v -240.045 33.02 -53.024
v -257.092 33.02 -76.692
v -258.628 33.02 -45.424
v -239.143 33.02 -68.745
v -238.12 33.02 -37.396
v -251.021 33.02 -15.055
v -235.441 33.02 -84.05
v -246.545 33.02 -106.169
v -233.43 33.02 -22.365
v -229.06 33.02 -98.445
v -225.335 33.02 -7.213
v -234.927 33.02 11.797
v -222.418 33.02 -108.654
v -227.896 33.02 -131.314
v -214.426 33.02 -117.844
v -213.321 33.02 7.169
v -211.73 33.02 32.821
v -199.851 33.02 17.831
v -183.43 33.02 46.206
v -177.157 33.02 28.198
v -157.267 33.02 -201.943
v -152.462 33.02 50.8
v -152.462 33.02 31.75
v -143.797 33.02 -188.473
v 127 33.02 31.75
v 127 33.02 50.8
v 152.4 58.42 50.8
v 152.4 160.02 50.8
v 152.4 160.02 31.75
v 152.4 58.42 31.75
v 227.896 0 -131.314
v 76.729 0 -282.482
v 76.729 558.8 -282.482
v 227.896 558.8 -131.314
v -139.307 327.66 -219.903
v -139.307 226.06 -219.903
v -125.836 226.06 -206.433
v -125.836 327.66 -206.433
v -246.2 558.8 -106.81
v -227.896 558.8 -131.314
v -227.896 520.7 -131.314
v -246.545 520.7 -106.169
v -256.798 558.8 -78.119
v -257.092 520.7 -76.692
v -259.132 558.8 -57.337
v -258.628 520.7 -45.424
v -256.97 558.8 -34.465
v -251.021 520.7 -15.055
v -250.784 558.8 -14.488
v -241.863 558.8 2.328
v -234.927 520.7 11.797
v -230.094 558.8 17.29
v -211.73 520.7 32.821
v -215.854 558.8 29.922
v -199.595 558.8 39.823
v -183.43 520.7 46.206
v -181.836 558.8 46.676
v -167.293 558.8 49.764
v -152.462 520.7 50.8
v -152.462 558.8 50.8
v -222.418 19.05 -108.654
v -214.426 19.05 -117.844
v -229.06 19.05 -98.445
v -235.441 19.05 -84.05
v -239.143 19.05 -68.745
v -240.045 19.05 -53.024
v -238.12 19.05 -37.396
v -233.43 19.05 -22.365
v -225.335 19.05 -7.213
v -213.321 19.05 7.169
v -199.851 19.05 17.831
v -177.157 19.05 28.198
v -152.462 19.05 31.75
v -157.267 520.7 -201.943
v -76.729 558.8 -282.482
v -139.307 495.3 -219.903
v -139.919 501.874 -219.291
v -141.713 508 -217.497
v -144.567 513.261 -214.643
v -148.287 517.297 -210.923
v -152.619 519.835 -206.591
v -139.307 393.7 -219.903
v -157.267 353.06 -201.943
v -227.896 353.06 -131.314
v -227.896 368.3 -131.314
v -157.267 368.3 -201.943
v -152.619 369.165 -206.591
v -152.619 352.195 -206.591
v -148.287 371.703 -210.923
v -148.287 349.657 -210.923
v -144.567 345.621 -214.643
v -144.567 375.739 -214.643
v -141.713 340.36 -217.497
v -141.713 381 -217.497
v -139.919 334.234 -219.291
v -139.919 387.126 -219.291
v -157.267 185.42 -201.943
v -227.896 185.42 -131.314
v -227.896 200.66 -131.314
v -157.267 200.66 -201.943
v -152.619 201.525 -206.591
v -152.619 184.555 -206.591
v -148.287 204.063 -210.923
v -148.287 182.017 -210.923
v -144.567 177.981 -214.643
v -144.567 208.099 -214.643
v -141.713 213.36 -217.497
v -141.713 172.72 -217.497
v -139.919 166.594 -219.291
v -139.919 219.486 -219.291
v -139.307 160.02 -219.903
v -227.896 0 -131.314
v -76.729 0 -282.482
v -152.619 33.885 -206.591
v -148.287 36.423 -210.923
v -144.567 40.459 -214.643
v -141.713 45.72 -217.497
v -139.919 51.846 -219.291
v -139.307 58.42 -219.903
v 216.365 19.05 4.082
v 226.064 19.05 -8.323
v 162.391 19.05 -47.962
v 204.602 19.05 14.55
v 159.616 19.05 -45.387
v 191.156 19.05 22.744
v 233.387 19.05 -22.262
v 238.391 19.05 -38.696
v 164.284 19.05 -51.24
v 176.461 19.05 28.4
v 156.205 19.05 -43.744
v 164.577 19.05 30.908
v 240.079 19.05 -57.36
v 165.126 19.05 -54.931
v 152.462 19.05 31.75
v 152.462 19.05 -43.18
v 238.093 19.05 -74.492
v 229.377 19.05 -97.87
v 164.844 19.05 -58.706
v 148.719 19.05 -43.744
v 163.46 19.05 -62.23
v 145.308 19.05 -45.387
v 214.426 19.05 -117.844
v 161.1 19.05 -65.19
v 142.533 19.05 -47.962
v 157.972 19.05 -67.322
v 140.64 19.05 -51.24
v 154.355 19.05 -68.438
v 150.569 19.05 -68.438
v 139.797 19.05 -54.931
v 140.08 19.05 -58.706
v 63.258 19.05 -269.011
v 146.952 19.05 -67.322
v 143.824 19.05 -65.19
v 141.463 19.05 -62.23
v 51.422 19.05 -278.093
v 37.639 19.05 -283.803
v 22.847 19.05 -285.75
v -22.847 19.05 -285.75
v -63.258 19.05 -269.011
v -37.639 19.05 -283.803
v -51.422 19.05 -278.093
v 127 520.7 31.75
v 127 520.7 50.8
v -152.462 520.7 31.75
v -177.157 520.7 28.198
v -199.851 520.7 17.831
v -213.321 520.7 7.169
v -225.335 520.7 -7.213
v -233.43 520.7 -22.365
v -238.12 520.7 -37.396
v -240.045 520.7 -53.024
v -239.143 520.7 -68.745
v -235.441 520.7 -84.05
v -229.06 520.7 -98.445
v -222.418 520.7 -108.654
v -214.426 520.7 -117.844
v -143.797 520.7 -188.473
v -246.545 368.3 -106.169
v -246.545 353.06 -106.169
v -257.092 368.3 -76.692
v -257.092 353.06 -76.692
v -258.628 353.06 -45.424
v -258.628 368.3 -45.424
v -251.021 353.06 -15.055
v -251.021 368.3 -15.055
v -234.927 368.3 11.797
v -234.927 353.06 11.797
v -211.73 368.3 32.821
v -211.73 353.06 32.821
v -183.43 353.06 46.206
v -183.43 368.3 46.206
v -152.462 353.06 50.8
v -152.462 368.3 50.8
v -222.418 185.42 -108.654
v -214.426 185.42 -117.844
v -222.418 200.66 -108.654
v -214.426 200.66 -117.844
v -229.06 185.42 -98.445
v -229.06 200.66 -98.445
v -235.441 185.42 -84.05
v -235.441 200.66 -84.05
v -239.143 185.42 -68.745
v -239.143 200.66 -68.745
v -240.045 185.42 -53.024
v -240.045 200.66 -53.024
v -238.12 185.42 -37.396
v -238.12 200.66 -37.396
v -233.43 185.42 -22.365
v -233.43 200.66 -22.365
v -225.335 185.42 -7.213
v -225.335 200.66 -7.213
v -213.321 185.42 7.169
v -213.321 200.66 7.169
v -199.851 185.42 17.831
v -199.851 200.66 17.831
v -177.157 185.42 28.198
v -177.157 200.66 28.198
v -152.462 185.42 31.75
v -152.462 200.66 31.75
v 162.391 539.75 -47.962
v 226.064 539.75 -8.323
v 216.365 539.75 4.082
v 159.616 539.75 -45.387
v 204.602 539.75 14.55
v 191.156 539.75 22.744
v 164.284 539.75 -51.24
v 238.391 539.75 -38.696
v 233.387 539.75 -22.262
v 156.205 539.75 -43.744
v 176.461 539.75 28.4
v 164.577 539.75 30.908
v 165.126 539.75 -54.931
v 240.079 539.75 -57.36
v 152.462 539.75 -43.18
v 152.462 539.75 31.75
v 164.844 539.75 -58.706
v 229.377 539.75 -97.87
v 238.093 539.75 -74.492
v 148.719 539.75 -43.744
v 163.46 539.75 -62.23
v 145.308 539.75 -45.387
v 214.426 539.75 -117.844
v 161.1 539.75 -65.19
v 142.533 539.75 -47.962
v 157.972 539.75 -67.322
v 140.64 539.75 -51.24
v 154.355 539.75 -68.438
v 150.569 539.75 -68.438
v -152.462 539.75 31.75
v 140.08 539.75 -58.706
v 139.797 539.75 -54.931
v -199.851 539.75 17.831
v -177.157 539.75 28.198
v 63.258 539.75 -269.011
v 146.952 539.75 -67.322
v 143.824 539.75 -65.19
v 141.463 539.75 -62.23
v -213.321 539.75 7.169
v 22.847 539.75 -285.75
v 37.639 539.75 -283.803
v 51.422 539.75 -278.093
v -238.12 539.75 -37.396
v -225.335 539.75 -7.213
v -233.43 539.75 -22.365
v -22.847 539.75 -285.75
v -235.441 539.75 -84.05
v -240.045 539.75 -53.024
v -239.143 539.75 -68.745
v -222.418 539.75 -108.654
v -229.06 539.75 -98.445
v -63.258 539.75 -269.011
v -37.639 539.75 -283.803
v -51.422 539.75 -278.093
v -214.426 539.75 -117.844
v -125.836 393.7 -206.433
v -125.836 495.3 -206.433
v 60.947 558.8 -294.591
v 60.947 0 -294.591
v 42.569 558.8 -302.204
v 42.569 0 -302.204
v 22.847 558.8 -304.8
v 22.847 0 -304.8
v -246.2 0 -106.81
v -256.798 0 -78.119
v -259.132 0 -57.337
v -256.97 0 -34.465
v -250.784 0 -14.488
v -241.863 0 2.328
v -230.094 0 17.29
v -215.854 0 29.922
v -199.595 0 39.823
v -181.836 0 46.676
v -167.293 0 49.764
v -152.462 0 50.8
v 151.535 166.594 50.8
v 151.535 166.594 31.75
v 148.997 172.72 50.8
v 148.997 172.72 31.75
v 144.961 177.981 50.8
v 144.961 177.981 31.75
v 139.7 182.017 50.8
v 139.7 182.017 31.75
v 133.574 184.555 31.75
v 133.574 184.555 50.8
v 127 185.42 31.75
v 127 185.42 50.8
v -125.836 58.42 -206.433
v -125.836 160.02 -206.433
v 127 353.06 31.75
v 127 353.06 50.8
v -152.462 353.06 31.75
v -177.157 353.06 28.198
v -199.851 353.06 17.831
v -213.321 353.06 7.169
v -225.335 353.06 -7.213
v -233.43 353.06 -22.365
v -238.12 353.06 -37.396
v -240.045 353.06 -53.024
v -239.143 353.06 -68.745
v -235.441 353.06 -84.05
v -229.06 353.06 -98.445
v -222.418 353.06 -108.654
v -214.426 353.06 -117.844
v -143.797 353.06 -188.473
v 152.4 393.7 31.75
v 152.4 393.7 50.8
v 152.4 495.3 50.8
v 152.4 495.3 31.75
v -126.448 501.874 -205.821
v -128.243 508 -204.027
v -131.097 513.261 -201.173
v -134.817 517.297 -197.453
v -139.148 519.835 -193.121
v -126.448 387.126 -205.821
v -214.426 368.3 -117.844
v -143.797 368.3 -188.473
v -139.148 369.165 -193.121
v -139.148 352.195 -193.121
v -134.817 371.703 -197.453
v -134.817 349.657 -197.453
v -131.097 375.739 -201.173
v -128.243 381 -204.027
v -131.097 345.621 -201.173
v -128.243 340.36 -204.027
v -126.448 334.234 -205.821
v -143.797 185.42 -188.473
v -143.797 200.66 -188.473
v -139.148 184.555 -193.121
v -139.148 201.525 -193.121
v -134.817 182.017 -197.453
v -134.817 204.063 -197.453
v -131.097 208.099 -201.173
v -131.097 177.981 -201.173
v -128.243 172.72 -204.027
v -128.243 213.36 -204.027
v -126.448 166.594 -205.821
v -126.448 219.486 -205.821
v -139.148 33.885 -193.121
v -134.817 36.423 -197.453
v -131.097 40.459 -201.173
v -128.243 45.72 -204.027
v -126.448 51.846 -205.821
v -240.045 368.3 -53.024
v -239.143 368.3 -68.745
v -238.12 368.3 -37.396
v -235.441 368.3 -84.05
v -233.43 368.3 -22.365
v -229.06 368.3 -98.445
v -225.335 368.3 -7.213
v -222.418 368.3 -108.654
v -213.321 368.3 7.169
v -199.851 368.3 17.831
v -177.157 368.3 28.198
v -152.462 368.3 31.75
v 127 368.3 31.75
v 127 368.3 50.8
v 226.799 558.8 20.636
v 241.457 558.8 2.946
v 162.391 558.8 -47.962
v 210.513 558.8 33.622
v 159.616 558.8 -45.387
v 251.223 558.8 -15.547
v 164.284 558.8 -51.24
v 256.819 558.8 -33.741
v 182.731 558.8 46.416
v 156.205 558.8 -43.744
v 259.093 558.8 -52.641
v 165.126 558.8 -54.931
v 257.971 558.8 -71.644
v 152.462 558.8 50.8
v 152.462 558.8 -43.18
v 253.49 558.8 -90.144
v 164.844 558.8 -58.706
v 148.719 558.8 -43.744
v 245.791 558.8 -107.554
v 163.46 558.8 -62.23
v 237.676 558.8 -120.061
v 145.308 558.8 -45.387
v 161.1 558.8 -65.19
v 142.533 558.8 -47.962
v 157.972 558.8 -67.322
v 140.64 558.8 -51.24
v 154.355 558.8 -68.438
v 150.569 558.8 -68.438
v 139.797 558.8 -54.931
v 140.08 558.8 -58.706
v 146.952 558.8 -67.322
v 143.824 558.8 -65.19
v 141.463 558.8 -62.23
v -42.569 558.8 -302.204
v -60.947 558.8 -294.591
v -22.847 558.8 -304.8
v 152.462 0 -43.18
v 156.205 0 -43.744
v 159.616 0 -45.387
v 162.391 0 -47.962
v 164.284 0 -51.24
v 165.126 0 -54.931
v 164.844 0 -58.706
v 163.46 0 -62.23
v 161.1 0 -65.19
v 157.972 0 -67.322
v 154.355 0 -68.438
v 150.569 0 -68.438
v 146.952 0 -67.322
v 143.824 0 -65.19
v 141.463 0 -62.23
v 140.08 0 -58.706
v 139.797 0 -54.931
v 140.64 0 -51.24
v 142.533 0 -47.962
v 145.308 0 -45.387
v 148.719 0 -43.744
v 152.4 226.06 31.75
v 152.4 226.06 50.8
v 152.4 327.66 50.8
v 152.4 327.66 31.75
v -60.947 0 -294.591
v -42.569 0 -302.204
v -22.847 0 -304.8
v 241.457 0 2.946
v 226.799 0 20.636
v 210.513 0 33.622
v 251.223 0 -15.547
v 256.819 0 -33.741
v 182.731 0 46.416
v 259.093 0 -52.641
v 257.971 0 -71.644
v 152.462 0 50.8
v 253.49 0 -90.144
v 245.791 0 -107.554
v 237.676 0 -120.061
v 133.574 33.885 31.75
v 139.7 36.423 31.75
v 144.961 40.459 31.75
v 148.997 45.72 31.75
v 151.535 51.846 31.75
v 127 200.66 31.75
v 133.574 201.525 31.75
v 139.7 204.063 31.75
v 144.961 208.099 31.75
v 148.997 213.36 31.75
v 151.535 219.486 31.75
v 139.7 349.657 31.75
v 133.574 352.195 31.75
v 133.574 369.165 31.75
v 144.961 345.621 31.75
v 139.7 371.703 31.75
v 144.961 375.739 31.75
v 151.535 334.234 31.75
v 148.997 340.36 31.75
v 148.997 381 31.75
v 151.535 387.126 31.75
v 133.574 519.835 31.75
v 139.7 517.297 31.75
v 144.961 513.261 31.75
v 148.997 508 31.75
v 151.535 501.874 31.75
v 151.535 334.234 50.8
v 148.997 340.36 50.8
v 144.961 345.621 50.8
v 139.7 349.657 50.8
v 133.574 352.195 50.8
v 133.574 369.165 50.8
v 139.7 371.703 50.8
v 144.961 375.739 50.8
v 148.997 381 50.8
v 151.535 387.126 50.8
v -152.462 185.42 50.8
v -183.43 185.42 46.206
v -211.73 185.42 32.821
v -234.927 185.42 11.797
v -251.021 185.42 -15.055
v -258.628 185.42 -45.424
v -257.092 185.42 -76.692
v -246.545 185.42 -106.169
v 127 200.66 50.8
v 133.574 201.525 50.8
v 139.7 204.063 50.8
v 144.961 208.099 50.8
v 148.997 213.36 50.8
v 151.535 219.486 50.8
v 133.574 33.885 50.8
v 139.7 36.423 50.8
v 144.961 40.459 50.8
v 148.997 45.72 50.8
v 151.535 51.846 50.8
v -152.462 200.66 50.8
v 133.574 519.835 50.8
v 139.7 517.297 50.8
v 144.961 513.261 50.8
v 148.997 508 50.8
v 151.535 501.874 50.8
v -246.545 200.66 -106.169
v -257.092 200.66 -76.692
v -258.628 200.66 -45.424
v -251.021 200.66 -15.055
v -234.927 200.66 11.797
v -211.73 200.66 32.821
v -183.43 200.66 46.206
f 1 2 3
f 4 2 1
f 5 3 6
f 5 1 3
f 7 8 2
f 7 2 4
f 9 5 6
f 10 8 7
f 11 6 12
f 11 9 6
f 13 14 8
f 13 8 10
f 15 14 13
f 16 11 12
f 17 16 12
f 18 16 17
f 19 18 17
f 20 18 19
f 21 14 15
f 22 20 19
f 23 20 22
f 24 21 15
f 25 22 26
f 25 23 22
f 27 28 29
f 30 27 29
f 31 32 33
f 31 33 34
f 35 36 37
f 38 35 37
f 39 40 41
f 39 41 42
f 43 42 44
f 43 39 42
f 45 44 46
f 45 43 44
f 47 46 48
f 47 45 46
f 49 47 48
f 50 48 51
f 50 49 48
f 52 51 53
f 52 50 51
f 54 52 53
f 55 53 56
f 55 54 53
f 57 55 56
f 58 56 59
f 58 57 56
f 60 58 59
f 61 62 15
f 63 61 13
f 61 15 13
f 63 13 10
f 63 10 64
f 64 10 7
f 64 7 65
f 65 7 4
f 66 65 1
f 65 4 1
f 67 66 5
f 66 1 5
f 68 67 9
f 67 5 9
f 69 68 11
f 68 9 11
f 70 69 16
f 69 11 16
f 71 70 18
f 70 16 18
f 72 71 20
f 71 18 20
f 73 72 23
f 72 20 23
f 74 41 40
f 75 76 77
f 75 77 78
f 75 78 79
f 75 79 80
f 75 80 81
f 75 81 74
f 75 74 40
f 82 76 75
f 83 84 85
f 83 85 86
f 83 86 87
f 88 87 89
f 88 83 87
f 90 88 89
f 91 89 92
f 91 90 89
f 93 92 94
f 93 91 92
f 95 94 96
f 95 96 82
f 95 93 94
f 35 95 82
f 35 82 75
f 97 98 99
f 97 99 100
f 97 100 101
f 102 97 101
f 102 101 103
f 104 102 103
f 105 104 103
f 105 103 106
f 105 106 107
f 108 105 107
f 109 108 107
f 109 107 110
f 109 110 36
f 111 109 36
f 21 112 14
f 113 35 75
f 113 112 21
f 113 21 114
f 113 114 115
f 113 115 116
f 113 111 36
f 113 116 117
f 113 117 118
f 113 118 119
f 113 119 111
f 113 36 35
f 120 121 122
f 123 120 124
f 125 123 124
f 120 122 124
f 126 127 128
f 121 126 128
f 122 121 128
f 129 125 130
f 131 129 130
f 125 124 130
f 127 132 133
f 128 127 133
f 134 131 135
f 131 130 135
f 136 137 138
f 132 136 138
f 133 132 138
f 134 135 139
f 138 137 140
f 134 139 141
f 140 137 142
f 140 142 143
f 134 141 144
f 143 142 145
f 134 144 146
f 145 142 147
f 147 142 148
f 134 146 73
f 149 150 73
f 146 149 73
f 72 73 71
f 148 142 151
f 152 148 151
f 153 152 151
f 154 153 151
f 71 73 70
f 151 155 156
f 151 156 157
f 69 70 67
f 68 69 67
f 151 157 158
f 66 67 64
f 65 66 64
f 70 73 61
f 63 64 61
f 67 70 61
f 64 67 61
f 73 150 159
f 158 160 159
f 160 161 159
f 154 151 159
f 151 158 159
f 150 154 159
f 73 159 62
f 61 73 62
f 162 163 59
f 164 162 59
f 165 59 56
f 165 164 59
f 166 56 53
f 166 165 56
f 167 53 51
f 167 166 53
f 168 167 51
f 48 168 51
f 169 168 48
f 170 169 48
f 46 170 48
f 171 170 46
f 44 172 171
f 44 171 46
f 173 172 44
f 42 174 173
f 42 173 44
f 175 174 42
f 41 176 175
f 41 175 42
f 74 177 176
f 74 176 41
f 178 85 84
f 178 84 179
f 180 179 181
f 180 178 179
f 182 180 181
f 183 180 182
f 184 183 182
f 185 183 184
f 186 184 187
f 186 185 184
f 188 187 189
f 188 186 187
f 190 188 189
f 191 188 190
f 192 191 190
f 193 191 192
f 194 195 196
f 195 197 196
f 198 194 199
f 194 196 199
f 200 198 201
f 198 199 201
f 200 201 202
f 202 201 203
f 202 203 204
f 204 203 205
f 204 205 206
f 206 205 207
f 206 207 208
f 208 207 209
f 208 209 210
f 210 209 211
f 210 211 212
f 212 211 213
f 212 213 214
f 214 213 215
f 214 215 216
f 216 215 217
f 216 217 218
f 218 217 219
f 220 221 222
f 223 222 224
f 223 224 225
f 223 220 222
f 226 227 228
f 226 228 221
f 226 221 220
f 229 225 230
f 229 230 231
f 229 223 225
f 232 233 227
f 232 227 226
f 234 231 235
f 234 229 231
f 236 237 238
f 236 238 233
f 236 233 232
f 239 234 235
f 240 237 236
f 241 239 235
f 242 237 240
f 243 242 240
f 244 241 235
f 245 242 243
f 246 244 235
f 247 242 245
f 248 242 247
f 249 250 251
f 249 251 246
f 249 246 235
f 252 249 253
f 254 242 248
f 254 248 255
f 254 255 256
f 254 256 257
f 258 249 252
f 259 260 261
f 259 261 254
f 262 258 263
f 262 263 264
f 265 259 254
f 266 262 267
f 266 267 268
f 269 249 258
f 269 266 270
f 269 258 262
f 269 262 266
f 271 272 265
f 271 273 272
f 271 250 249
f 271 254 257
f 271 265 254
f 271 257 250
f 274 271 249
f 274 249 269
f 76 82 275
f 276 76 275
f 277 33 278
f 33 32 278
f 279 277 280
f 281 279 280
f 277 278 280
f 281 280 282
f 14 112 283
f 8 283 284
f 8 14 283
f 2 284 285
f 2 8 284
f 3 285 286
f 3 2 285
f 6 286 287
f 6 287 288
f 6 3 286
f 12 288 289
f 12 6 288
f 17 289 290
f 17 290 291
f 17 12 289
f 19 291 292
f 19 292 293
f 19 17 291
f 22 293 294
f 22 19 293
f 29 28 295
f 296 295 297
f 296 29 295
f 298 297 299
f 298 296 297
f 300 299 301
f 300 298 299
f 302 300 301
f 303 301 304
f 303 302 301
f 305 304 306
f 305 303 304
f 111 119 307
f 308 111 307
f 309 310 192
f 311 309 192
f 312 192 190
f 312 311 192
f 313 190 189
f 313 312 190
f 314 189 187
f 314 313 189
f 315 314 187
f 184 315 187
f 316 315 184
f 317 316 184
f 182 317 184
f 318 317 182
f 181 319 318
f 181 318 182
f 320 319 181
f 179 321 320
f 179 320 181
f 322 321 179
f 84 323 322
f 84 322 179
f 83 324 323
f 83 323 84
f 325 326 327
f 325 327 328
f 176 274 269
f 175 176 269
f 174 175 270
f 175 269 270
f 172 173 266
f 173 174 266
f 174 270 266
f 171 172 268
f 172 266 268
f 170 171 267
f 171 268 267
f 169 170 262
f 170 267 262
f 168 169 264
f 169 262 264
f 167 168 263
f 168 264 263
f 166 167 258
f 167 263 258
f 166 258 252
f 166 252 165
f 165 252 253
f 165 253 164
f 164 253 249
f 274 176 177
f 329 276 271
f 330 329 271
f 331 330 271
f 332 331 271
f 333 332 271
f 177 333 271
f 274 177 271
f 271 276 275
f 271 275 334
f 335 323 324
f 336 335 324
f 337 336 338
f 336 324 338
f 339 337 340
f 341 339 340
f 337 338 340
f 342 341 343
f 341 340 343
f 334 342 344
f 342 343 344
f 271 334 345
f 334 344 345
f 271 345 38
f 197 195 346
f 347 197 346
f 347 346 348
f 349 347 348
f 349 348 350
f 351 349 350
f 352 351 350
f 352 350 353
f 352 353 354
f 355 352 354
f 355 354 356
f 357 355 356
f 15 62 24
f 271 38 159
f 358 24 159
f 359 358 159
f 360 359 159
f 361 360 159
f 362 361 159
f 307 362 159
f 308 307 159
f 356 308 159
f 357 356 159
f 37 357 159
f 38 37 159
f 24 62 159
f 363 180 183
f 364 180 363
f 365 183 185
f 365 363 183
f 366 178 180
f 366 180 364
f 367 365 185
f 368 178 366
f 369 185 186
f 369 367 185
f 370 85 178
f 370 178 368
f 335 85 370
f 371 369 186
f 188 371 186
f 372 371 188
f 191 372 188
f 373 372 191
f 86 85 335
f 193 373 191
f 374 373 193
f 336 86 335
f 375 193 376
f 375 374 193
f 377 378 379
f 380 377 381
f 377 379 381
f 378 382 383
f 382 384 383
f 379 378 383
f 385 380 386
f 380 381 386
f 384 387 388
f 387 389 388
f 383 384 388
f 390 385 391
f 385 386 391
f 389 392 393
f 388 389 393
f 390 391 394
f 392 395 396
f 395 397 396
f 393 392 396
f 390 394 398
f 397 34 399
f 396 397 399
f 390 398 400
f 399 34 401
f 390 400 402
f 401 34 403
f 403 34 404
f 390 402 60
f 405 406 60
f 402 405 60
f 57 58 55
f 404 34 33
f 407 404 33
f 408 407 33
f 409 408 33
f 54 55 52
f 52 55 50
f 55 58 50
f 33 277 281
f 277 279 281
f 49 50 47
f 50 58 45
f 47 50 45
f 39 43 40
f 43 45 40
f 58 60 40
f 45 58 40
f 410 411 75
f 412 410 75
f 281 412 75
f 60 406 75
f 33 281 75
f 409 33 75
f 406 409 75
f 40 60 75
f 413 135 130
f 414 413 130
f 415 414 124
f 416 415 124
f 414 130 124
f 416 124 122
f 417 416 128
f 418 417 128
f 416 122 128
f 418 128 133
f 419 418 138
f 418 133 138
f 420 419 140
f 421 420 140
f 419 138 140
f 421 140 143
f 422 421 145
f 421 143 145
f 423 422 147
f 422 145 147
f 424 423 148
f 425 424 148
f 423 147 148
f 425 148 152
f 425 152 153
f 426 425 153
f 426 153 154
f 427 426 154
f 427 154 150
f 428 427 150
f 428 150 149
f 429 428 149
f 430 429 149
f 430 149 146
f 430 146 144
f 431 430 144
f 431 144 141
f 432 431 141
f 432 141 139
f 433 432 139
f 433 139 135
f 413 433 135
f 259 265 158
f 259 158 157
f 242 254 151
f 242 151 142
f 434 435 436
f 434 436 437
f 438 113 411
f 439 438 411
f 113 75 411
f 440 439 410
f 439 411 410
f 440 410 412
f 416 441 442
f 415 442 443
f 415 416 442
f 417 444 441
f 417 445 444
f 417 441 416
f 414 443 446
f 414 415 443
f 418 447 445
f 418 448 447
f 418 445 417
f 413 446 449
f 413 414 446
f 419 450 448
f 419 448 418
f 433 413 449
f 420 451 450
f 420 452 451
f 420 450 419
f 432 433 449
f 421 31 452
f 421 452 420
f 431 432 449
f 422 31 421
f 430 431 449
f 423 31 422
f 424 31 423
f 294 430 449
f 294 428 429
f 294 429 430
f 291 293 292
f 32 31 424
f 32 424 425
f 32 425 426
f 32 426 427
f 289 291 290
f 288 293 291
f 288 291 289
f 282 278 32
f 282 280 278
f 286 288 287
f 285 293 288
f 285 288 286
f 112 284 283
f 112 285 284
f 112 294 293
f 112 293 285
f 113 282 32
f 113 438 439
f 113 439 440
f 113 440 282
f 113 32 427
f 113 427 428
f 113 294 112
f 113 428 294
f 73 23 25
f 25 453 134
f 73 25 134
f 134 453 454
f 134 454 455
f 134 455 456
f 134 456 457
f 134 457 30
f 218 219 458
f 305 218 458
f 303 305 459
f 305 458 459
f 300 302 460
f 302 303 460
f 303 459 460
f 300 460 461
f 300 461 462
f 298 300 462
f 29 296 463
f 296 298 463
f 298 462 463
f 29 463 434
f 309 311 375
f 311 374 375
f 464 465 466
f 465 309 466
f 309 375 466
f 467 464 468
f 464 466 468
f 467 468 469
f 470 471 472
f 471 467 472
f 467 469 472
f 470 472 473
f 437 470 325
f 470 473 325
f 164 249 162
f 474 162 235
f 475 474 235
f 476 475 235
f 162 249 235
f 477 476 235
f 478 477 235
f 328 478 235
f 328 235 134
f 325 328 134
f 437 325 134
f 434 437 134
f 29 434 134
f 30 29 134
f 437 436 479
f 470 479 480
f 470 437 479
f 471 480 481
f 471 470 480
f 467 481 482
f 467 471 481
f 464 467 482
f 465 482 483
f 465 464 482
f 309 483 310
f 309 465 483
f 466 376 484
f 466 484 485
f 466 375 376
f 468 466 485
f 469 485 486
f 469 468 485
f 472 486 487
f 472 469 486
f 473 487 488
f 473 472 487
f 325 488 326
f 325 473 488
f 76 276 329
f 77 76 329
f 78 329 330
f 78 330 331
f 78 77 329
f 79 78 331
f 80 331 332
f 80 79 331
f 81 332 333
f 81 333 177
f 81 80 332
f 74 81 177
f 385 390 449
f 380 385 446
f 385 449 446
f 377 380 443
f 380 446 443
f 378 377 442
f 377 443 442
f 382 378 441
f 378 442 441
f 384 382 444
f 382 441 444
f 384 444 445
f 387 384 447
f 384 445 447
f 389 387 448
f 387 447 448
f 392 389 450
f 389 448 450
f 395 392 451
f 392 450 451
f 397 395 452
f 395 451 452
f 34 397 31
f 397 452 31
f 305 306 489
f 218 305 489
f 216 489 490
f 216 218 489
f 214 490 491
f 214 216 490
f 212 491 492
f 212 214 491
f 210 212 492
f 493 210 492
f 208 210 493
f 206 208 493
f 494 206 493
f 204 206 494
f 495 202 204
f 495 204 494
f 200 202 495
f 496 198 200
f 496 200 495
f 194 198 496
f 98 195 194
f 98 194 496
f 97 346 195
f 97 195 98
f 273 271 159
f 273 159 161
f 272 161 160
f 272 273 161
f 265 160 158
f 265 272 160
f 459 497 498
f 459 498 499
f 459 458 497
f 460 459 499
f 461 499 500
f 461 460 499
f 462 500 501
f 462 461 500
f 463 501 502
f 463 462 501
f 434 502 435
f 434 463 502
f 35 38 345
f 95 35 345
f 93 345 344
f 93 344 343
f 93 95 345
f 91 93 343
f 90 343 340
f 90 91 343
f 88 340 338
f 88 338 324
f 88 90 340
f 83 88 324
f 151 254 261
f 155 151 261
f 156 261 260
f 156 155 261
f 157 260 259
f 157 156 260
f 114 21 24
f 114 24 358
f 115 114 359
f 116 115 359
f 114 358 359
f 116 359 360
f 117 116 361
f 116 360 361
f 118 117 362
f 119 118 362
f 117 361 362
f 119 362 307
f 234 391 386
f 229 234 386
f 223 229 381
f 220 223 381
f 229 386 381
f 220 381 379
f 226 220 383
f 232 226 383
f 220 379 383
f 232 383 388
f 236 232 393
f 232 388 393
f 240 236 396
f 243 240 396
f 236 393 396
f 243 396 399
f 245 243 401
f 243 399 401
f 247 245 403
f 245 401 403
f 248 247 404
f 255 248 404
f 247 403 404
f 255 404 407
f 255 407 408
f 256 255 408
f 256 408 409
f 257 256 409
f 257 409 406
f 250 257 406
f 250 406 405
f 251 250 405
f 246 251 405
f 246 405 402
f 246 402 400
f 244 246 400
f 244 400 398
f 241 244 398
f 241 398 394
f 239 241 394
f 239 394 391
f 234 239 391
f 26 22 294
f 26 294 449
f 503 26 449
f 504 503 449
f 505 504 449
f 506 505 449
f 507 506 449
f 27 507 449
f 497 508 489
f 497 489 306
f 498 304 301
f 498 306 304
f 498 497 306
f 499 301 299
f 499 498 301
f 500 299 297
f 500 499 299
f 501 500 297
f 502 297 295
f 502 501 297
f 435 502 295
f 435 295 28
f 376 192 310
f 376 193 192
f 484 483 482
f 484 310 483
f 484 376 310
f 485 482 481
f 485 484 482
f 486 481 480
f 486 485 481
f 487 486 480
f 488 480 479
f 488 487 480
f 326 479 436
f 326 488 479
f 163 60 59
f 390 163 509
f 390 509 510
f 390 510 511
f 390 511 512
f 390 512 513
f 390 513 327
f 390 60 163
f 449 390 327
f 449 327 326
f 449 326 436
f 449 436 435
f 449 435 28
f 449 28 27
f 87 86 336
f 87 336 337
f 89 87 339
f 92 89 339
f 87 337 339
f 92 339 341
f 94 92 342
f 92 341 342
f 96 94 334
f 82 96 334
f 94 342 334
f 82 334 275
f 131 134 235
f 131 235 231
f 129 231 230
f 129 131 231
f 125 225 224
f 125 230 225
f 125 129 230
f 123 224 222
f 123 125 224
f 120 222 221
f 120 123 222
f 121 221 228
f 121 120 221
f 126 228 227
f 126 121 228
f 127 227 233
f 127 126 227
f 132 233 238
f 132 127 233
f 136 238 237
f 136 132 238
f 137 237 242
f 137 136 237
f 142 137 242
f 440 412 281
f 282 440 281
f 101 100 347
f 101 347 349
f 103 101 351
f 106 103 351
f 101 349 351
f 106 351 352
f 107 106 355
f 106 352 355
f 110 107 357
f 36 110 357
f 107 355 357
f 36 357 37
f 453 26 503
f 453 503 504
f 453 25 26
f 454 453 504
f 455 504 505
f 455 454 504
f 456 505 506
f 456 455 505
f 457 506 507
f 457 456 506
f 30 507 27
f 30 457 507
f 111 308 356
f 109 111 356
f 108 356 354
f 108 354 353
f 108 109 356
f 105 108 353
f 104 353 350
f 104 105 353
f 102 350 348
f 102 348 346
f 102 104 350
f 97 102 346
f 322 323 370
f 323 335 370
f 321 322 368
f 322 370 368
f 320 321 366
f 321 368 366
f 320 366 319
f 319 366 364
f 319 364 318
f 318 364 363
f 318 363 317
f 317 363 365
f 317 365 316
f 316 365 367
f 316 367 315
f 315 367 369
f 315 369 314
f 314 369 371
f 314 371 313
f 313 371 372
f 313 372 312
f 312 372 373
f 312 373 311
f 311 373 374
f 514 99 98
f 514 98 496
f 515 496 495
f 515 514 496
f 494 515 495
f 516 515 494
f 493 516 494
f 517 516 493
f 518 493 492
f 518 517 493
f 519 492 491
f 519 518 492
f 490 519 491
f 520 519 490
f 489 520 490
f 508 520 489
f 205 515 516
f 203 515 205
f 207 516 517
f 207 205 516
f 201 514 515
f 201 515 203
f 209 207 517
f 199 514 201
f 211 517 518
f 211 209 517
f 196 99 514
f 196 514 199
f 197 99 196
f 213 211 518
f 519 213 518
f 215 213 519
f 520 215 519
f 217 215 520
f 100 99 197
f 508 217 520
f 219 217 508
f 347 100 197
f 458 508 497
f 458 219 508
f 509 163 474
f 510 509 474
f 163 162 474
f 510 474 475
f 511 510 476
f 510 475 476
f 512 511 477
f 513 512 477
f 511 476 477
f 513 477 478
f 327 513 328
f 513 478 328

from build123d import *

# Parameters (mm, degrees)
BOSS_EXTRUDE1_DEPTH    = 558.8
SKETCH2_W              = 1233.22752028
SKETCH2_H              = 1270
SKETCH2_W_2            = 864.480609306
SKETCH2_H_2            = 355.6
CUT_EXTRUDE1_DEPTH     = 756.196292364
FILLET1_R              = 213.36
FILLET2_R              = 76.2
FILLET5_R              = 106.68
SHELL1_T               = 19.05
SKETCH7_W              = 20.32
SKETCH7_H              = 152.4
SKETCH7_2_W            = 20.32
SKETCH7_2_H            = 152.4
CUT_EXTRUDE2_DEPTH     = 152.4
FILLET6_R              = 25.4
LPATTERN1_COUNT        = 3
LPATTERN1_PITCH        = 167.64
FILLET6_OF_LPATTERN1_R = 25.4
SKETCH10_R             = 12.7
CUT_EXTRUDE3_DEPTH     = 688.251792528


with BuildPart() as part:
    # Sketch1 → Boss-Extrude1 (new body)
    with BuildSketch(Plane(origin=(0, 0, 0), x_dir=(1, 0, 0), z_dir=(0, 1, 0))):
        Polygon((359.210244843, 0), (0, -359.210244843), (-359.210244843, 0), (0, 359.210244843), align=None)
    extrude(amount=BOSS_EXTRUDE1_DEPTH)

    # Sketch2 → Cut-Extrude1 (cut, through all)
    with BuildSketch(Plane(origin=(0, 558.8, 0), x_dir=(1, 0, 0), z_dir=(0, 1, 0))):
        with Locations((0, 127)):
            Rectangle(SKETCH2_W, SKETCH2_H)
        with Locations((0, 127)):
            Rectangle(SKETCH2_W_2, SKETCH2_H_2, mode=Mode.SUBTRACT)
    extrude(amount=-CUT_EXTRUDE1_DEPTH, mode=Mode.SUBTRACT)

    # Fillet1
    # the kernel refuses this fillet: 213.36 mm, written as the material it takes off along each edge
    with BuildSketch(Plane(origin=(359.210244843, -399.180090434, 0), x_dir=(-0.707106781186546, 0, 0.707106781186549), z_dir=(0, 1, 0))) as fillet1_piece_1:
        with BuildLine():
            CenterArc((213.36, -159.672036174), FILLET1_R, 131.550696865, 48.449303135)
            Line((0, -159.672036174), (-4.2672, -159.672036174))
            Line((-4.2672, -159.672036174), (-4.2672, 0))
            Line((-4.2672, 0), (0, 4.2672))
            ThreePointArc((0, 4.2672), (35.921024484, 4.2672), (69.011689948, 3.193440723))
            Line((69.011689948, 3.193440723), (71.842048969, 0))
        make_face()
    extrude(amount=1357.160180869, mode=Mode.SUBTRACT)
    with BuildSketch(Plane(origin=(-359.210244843, -399.180090434, 0), x_dir=(0.707106781186546, 0, -0.7071067811865489), z_dir=(0, 1, 0))) as fillet1_piece_2:
        with BuildLine():
            CenterArc((159.672036174, -213.36), FILLET1_R, 90, 48.449303135)
            Line((0, -71.842048969), (-3.193440723, -69.011689948))
            ThreePointArc((-3.193440723, -69.011689948), (-4.2672, -35.921024484), (-4.2672, 0))
            Line((-4.2672, 0), (0, 4.2672))
            Line((0, 4.2672), (159.672036174, 4.2672))
            Line((159.672036174, 4.2672), (159.672036174, 0))
        make_face()
    extrude(amount=1357.160180869, mode=Mode.SUBTRACT)

    # Fillet2
    fillet2_edges = [part.edges().sort_by_distance(p)[0] for p in [
        (54.410244843, 279.4, -304.8),
        (-54.410244843, 279.4, -304.8),
    ]]
    fillet(fillet2_edges, radius=FILLET2_R)

    # Fillet5
    fillet5_edges = [part.edges().sort_by_distance(p)[0] for p in [
        (308.410244843, 279.4, 50.8),
        (-308.410244843, 279.4, 50.8),
    ]]
    fillet(fillet5_edges, radius=FILLET5_R)

    # Shell1 (no face opened: a closed hollow body)
    add(offset(amount=-SHELL1_T, mode=Mode.PRIVATE), mode=Mode.SUBTRACT)

    # Cut-Sweep1: sweep along a path in Sketch8
    with BuildLine(Plane(origin=(0, 558.8, 0), x_dir=(1, 0, 0), z_dir=(0, 1, 0))) as cut_sweep1_path:
        Line((0, -50.8), (-152.461942009, -50.8))
        ThreePointArc((-152.461942009, -50.8), (-251.021410537, 15.055331435), (-227.896093426, 131.314151417))
        Line((-227.896093426, 131.314151417), (-139.3067744, 219.903470443))
    # Sketch7 → Cut-Sweep1 (sweep, cut)
    with BuildSketch(Plane(origin=(0, 0, 0), x_dir=(0, 0, -1), z_dir=(1, 0, 0))):
        with Locations((-40.64, 444.5)):
            Rectangle(SKETCH7_W, SKETCH7_H)
    cut_sweep1 = sweep(path=cut_sweep1_path.line, mode=Mode.SUBTRACT)

    # Sketch7<2> → Cut-Extrude2 (cut)
    with BuildSketch(Plane(origin=(0, 0, 0), x_dir=(0, 0, -1), z_dir=(1, 0, 0))):
        with Locations((-40.64, 444.5)):
            Rectangle(SKETCH7_2_W, SKETCH7_2_H)
    cut_extrude2 = extrude(amount=CUT_EXTRUDE2_DEPTH, mode=Mode.SUBTRACT)

    # Fillet6
    fillet6_edges = [part.edges().sort_by_distance(p)[0] for p in [
        (-132.571582309, 520.7, -213.168278352),
        (-132.571582309, 368.3, -213.168278352),
        (152.4, 368.3, 41.275),
        (152.4, 520.7, 41.275),
    ]]
    fillet(fillet6_edges, radius=FILLET6_R)

    # LPattern1: Cut-Sweep1, Cut-Extrude2 ×3
    with Locations(*[(0, -i * LPATTERN1_PITCH, 0) for i in range(1, LPATTERN1_COUNT)]):
        add(cut_sweep1, mode=Mode.SUBTRACT)
        add(cut_extrude2, mode=Mode.SUBTRACT)

    # Fillet6 of LPattern1
    fillet6_of_lpattern1_edges = [part.edges().sort_by_distance(p)[0] for p in [
        (-132.571582309, 353.06, -213.168278352),
        (-132.571582309, 200.66, -213.168278352),
        (152.4, 200.66, 41.275),
        (152.4, 353.06, 41.275),
        (-132.571582309, 185.42, -213.168278352),
        (-132.571582309, 33.02, -213.168278352),
        (152.4, 33.02, 41.275),
        (152.4, 185.42, 41.275),
    ]]
    fillet(fillet6_of_lpattern1_edges, radius=FILLET6_OF_LPATTERN1_R)

    # Sketch10 → Cut-Extrude3 (cut, through all)
    with BuildSketch(Plane(origin=(0, 558.8, 0), x_dir=(1, 0, 0), z_dir=(0, 1, 0))):
        with Locations(Location((152.461942009, 55.88, 0), (0, 0, 270))):
            Circle(SKETCH10_R)
    extrude(amount=-CUT_EXTRUDE3_DEPTH, mode=Mode.SUBTRACT)


solid = part.part
